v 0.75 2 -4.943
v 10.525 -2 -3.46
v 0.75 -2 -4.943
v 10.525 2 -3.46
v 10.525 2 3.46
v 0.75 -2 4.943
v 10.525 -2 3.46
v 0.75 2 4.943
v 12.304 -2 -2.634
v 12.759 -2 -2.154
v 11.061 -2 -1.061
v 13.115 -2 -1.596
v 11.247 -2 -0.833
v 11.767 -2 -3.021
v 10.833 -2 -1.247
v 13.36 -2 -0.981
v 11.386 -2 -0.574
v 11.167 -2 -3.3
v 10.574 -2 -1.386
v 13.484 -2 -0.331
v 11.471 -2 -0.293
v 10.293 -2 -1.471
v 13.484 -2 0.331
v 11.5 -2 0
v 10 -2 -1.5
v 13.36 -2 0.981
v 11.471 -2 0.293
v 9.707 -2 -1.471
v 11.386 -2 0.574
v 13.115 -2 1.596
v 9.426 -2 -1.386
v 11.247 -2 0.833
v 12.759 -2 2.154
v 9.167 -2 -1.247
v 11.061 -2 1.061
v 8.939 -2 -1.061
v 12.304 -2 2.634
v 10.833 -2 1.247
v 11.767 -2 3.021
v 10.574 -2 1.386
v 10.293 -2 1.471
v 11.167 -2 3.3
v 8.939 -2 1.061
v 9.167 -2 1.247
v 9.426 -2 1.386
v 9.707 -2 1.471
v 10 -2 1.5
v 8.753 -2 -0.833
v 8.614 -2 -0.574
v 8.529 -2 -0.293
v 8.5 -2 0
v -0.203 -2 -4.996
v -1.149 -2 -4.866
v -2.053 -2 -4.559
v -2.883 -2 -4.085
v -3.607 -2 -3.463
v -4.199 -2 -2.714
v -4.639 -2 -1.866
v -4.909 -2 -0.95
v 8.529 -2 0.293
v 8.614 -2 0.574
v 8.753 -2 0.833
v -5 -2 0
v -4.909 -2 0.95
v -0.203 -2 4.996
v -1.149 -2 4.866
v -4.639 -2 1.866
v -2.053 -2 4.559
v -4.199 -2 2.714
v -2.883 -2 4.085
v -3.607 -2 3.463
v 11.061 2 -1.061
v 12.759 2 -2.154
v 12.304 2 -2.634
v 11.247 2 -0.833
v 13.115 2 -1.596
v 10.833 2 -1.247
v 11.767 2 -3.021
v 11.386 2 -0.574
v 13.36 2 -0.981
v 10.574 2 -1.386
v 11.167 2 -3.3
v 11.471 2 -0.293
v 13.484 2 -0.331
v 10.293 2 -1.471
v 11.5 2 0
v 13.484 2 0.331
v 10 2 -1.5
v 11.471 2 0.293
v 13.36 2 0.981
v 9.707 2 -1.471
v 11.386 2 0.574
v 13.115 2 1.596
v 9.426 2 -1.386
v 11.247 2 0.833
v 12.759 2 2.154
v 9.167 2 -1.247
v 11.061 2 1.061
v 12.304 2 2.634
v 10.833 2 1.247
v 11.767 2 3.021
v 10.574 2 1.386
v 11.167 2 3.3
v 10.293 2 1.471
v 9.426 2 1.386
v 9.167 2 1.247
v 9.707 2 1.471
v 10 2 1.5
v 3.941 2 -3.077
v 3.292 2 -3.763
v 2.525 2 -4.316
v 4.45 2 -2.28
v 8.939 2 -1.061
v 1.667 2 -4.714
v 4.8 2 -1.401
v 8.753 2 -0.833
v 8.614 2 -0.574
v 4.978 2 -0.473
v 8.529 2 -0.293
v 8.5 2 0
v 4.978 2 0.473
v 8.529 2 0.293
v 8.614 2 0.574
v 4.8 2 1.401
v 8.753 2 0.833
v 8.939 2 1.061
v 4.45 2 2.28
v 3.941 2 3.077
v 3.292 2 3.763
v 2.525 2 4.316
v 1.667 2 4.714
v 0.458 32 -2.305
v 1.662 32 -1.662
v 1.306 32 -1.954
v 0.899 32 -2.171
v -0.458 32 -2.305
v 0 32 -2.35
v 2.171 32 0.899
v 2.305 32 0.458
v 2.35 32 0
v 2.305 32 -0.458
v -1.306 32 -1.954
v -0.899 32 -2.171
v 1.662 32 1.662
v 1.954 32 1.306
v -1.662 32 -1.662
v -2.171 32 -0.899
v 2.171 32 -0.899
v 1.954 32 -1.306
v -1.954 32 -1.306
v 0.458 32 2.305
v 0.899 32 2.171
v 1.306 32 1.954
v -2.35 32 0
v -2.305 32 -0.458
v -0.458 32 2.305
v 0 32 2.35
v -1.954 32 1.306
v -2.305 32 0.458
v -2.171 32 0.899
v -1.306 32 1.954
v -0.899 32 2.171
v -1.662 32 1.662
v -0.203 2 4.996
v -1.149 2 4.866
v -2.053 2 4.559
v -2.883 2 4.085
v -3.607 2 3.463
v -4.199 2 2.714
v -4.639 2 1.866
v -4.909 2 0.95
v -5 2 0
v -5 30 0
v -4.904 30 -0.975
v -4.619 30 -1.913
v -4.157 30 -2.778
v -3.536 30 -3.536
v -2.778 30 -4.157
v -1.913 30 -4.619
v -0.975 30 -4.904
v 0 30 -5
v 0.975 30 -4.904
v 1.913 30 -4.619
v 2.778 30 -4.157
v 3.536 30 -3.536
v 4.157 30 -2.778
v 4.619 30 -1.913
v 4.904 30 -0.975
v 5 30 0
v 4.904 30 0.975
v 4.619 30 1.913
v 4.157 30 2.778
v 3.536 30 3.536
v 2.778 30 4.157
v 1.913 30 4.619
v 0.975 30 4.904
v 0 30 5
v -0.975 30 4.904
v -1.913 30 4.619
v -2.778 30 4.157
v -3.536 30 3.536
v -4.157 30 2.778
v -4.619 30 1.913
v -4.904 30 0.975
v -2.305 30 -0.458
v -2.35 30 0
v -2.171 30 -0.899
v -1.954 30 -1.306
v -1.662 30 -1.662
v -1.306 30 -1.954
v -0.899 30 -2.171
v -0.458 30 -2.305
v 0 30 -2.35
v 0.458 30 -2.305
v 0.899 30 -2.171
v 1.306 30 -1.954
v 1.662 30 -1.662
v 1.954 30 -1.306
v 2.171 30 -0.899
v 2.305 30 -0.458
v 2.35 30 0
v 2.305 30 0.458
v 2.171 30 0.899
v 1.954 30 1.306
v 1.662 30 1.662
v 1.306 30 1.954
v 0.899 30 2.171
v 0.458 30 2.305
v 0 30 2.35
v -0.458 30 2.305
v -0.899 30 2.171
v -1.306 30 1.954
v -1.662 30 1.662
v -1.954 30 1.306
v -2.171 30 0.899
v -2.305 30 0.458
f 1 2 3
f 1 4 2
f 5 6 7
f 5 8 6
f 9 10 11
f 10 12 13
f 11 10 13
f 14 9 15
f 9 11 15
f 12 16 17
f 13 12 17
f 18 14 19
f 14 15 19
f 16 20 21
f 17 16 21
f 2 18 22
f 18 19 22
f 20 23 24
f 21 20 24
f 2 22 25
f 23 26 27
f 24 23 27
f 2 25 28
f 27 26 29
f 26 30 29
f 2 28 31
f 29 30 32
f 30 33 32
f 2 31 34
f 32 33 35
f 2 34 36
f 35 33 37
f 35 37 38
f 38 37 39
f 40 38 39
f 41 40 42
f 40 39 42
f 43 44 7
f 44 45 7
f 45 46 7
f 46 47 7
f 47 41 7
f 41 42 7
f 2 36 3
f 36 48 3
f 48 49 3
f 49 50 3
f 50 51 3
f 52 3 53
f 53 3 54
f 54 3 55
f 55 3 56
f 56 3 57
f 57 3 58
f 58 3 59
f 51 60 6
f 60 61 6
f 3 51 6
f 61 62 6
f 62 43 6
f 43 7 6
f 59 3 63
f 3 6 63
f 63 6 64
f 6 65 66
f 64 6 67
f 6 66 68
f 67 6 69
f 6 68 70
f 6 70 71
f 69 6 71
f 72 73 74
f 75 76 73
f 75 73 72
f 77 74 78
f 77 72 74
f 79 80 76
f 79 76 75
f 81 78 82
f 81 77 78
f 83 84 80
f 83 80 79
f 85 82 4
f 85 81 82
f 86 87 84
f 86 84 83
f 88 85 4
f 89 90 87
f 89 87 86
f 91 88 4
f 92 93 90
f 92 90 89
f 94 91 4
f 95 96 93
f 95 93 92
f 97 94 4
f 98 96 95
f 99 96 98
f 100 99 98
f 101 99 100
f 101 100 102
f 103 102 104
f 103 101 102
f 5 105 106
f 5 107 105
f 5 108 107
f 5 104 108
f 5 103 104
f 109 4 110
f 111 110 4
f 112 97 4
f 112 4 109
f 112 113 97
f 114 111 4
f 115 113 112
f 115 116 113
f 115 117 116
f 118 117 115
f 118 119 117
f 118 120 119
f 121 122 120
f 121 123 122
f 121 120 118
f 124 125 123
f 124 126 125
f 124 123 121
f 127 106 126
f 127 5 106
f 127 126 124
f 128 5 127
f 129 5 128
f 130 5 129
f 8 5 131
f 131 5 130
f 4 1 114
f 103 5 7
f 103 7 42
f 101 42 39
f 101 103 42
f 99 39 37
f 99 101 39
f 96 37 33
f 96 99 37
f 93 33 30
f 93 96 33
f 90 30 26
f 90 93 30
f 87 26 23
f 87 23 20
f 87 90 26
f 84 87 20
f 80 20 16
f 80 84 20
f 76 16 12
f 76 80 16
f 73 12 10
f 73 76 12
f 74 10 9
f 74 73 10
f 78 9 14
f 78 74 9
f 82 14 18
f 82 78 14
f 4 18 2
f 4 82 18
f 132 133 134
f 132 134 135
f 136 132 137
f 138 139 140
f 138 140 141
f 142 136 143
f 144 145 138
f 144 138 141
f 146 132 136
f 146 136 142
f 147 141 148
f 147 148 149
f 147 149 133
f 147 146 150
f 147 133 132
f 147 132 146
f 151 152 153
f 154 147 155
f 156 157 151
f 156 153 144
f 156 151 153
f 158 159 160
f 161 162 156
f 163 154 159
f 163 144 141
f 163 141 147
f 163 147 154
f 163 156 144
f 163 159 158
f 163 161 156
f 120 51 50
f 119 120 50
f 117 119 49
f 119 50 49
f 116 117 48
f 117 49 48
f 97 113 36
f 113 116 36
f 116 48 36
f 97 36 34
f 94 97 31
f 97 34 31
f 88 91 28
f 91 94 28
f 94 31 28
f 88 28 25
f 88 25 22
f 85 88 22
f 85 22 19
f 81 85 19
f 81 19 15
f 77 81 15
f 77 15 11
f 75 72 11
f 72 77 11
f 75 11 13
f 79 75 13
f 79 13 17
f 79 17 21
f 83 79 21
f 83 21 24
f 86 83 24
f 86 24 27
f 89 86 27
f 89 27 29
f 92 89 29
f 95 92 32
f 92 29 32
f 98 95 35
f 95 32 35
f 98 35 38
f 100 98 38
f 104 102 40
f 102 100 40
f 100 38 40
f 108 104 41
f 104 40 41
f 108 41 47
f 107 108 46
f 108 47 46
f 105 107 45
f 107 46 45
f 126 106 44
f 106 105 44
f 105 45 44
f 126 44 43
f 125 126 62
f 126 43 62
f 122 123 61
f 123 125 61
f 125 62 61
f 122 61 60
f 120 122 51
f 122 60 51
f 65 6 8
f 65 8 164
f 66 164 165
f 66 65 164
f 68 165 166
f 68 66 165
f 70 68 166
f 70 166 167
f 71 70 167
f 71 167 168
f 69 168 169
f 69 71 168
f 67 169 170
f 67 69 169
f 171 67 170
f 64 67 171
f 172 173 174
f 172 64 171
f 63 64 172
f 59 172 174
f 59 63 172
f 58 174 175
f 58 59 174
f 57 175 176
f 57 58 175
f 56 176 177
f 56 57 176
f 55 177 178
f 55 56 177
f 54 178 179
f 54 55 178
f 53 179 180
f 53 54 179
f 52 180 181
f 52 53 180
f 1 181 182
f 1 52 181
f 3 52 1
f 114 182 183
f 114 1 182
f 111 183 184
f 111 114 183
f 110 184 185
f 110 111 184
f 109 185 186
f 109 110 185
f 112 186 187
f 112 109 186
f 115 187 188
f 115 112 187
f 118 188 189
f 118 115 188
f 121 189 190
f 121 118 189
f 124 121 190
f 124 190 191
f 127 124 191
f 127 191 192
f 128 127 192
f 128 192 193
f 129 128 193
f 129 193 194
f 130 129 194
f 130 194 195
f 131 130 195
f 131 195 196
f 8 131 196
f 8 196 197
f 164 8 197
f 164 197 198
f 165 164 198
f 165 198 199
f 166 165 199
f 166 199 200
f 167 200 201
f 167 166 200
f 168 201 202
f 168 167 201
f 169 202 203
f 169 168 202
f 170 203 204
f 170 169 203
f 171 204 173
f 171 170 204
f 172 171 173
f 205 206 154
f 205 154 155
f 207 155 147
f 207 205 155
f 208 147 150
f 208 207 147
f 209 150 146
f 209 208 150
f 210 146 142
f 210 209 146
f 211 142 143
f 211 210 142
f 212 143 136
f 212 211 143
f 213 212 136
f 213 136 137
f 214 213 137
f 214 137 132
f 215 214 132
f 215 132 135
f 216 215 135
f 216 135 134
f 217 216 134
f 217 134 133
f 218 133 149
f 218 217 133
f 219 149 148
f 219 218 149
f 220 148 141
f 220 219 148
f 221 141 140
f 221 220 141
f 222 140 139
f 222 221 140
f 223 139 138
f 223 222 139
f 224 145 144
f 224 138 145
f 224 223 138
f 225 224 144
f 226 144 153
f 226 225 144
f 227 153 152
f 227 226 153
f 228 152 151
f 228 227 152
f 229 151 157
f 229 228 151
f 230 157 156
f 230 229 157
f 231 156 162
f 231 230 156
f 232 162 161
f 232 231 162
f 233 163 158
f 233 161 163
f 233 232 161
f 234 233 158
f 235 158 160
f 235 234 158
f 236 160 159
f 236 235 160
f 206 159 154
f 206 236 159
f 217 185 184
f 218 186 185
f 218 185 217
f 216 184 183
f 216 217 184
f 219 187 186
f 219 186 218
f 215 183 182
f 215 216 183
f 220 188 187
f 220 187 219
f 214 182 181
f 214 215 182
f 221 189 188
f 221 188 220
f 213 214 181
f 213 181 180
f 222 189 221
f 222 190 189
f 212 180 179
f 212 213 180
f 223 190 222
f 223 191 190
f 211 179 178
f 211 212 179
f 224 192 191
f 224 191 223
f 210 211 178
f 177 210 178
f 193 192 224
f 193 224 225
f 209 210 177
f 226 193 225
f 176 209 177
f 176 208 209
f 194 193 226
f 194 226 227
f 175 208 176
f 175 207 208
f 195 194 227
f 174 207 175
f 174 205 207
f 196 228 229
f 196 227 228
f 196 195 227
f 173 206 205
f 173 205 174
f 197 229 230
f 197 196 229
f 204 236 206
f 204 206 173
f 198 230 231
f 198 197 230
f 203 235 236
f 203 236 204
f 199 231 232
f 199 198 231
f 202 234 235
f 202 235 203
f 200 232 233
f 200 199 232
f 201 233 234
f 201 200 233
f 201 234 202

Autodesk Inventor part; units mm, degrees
ref_plane "XZ Plane" through (0, 0, 0) normal (0, 1, 0) x (-1, 0, 0)
sketch "Sketch1" plane through (0, 0, 0) normal (0, 1, 0) x (-1, 0, 0)
  circle A0 centre (0, 0) radius 2.35
  circle A1 centre (0, 0) radius 5
  circle A2 centre (-10, 0) radius 1.5
  line L0 (-0.75, 4.9434) -> (-10.525, 3.4604)
  arc A3 (-10.525, 3.4604) -> (-10.525, -3.4604) centre (-10, 0) ccw
  line L1 (-10.525, -3.4604) -> (-0.75, -4.9434)
  dimension "d0" = 4.7
  dimension "d1" = 10
  dimension "d2" = 3
  dimension "d3" = 10
  dimension "d4" = 2
extrude "Extrusion1" add sketch "Sketch1" against normal blind 2 and the other way blind 2 contours A0 | A1 | A1 L1 A3 L0
extrude "Extrusion2" add sketch "Sketch1" along normal blind 30 contours A1
extrude "Extrusion3" add sketch "Sketch1" along normal blind 32 contours A0
ref_plane "Work Plane1" through (-5, 0, 0) normal (1, 0, 0) x (0, 1, 0)
ref_plane "Work Plane2" through (-7, 0, 0) normal (1, 0, 0) x (0, 1, 0)
sketch "Sketch2" plane through (-7, 0, 0) normal (1, 0, 0) x (0, 1, 0)
  line L0 (30, -15) -> (-2, -15)
  line L1 (-2, 15) -> (30, 15)
  line L2 (30, 15) -> (30, -15)
  line L3 (30, -5) -> (30, 5) projected
  line L4 (-2, -4.9434) -> (2, -4.9434) projected
  line L5 (-2, 4.9434) -> (-2, -4.9434) projected
  line L6 (2, 4.9434) -> (-2, 4.9434) projected
  line L7 (2, -4.9434) -> (2, 4.9434) projected
  line L8 (-2, -15) -> (-2, 15)
  point P0 (0, 0)
  dimension "d11" = 30
  dimension "d12" = 15
sketch "Sketch3" plane through (-7, 0, 0) normal (-1, 0, 0) x (0, 0, 1)
  line L0 (-10, 22.6542) -> (10, 22.6542) construction
  line L1 (10, 22.6542) -> (10, 2.6542) construction
  line L2 (10, 2.6542) -> (-10, 2.6542) construction
  line L3 (-10, 2.6542) -> (-10, 22.6542) construction
  line L4 (15, -2) -> (15, 30) construction
  line L5 (15, 30) -> (-15, 30) construction
  line L6 (0, 0) -> (15, 0) construction
  point P0 (0, 0)
  point P1 (10, 12.6542)
  point P2 (15, 14)
  point P3 (0, 22.6542)
  point P4 (0, 30)
  dimension "d24" = 20
  dimension "d25" = 20
properties part number "Pok Mk3 Yaw Motor Support Min" material "ABS Plastic"
